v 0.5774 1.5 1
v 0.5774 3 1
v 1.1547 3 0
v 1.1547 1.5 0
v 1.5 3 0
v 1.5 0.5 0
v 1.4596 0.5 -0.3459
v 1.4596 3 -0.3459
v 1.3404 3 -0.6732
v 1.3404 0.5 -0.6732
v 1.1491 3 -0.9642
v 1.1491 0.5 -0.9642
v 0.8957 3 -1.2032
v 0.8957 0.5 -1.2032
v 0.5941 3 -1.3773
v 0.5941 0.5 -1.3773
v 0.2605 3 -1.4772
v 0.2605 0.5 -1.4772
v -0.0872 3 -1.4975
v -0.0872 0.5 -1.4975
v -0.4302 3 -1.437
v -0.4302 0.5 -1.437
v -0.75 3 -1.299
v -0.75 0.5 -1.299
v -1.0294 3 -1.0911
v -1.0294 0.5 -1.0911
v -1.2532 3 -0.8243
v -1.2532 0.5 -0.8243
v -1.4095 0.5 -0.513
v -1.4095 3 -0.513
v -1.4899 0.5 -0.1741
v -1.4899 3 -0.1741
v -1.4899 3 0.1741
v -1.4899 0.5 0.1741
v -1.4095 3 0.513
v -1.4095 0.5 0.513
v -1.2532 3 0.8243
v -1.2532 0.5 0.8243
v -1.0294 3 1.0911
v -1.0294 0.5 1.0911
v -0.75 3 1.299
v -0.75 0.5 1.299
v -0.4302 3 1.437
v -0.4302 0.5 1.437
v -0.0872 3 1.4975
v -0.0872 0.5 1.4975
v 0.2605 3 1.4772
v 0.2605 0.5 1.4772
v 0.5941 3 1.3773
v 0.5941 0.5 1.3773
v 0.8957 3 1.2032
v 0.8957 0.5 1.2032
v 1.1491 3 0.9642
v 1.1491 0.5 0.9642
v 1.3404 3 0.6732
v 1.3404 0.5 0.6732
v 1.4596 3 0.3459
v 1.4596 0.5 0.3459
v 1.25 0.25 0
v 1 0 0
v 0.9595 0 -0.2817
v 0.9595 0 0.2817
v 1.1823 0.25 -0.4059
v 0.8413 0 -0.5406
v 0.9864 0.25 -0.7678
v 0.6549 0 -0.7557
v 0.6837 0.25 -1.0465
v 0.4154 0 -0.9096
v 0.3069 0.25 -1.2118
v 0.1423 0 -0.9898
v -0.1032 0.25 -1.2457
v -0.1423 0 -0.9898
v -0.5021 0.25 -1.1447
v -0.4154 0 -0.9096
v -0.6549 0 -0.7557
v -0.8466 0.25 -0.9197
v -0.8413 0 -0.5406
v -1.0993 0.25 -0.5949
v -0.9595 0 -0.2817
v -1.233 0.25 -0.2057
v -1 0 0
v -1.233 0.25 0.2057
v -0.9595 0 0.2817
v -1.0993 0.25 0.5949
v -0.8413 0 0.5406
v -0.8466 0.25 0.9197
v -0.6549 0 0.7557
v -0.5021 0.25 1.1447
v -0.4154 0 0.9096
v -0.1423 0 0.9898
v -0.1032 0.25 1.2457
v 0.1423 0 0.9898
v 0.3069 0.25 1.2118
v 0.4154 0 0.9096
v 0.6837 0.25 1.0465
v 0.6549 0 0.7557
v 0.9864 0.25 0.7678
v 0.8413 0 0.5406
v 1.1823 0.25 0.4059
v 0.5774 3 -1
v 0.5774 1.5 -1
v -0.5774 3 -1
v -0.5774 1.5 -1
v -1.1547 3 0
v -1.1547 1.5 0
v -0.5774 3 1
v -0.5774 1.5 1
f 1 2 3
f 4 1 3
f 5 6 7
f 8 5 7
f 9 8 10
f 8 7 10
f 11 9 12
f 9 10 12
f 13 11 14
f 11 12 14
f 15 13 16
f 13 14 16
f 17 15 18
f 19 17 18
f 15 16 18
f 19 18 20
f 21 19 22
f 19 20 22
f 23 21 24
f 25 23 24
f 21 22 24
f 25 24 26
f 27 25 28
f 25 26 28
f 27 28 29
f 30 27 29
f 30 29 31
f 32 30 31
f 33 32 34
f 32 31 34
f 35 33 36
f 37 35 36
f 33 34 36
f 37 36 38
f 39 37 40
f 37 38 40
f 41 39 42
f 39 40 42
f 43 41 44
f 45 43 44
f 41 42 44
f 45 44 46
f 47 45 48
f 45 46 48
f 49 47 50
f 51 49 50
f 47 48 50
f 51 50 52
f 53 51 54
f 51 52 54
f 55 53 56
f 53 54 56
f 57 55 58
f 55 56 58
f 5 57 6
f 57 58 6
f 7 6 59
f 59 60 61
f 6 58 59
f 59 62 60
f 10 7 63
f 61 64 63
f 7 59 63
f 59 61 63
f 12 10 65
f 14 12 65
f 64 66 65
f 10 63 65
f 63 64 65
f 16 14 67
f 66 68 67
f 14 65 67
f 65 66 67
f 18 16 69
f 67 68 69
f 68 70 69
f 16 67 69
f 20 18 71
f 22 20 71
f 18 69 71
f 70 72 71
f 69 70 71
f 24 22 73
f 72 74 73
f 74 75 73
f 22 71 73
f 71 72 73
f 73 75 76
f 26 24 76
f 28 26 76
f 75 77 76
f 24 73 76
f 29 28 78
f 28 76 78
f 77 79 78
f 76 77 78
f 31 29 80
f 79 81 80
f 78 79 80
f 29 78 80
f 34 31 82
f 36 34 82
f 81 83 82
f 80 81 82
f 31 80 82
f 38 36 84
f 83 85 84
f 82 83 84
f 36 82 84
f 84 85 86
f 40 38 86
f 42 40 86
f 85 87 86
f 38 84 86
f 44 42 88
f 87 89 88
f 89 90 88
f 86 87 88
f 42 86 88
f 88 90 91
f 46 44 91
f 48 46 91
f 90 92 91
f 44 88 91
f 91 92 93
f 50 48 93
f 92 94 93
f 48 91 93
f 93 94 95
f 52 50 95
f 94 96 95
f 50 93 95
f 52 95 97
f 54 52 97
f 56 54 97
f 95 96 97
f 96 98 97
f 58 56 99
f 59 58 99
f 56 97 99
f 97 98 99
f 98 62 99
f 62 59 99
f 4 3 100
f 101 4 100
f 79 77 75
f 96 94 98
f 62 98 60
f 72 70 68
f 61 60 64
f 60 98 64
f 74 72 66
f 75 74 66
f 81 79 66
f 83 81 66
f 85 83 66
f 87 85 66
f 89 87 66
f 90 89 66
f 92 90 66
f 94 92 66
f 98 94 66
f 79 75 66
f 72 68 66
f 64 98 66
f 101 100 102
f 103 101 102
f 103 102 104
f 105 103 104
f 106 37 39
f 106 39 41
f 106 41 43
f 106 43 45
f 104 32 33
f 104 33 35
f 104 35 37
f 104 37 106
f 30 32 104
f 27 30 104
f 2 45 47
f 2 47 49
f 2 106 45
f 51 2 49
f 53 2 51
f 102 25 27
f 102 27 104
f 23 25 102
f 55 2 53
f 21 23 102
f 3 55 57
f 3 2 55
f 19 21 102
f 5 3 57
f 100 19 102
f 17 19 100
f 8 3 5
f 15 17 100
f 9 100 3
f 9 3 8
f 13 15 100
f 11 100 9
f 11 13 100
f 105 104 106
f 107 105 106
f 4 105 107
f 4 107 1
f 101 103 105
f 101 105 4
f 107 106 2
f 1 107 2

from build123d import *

# Parameters (mm, degrees)
SKETCH1_R           = 1.5
BOSS_EXTRUDE1_DEPTH = 3
CHAMFER1_SIZE       = 0.5
CUT_EXTRUDE1_DEPTH  = 1.5


with BuildPart() as part:
    # Sketch1 → Boss-Extrude1 (new body)
    with BuildSketch(Plane(origin=(0, 0, 0), x_dir=(1, 0, 0), z_dir=(0, 1, 0))):
        Circle(SKETCH1_R)
    extrude(amount=BOSS_EXTRUDE1_DEPTH)

    # Chamfer1
    chamfer1_edges = [part.edges().sort_by_distance(p)[0] for p in [
        (-1.5, 0, 0),
    ]]
    chamfer(chamfer1_edges, length=CHAMFER1_SIZE)

    # Sketch2 → Cut-Extrude1 (cut)
    with BuildSketch(Plane(origin=(0, 3, 0), x_dir=(1, 0, 0), z_dir=(0, 1, 0))):
        Polygon((0.577350269, -1), (1.154700538, 0), (0.577350269, 1), (-0.577350269, 1), (-1.154700538, 0), (-0.577350269, -1), align=None)
    extrude(amount=-CUT_EXTRUDE1_DEPTH, mode=Mode.SUBTRACT)


solid = part.part
